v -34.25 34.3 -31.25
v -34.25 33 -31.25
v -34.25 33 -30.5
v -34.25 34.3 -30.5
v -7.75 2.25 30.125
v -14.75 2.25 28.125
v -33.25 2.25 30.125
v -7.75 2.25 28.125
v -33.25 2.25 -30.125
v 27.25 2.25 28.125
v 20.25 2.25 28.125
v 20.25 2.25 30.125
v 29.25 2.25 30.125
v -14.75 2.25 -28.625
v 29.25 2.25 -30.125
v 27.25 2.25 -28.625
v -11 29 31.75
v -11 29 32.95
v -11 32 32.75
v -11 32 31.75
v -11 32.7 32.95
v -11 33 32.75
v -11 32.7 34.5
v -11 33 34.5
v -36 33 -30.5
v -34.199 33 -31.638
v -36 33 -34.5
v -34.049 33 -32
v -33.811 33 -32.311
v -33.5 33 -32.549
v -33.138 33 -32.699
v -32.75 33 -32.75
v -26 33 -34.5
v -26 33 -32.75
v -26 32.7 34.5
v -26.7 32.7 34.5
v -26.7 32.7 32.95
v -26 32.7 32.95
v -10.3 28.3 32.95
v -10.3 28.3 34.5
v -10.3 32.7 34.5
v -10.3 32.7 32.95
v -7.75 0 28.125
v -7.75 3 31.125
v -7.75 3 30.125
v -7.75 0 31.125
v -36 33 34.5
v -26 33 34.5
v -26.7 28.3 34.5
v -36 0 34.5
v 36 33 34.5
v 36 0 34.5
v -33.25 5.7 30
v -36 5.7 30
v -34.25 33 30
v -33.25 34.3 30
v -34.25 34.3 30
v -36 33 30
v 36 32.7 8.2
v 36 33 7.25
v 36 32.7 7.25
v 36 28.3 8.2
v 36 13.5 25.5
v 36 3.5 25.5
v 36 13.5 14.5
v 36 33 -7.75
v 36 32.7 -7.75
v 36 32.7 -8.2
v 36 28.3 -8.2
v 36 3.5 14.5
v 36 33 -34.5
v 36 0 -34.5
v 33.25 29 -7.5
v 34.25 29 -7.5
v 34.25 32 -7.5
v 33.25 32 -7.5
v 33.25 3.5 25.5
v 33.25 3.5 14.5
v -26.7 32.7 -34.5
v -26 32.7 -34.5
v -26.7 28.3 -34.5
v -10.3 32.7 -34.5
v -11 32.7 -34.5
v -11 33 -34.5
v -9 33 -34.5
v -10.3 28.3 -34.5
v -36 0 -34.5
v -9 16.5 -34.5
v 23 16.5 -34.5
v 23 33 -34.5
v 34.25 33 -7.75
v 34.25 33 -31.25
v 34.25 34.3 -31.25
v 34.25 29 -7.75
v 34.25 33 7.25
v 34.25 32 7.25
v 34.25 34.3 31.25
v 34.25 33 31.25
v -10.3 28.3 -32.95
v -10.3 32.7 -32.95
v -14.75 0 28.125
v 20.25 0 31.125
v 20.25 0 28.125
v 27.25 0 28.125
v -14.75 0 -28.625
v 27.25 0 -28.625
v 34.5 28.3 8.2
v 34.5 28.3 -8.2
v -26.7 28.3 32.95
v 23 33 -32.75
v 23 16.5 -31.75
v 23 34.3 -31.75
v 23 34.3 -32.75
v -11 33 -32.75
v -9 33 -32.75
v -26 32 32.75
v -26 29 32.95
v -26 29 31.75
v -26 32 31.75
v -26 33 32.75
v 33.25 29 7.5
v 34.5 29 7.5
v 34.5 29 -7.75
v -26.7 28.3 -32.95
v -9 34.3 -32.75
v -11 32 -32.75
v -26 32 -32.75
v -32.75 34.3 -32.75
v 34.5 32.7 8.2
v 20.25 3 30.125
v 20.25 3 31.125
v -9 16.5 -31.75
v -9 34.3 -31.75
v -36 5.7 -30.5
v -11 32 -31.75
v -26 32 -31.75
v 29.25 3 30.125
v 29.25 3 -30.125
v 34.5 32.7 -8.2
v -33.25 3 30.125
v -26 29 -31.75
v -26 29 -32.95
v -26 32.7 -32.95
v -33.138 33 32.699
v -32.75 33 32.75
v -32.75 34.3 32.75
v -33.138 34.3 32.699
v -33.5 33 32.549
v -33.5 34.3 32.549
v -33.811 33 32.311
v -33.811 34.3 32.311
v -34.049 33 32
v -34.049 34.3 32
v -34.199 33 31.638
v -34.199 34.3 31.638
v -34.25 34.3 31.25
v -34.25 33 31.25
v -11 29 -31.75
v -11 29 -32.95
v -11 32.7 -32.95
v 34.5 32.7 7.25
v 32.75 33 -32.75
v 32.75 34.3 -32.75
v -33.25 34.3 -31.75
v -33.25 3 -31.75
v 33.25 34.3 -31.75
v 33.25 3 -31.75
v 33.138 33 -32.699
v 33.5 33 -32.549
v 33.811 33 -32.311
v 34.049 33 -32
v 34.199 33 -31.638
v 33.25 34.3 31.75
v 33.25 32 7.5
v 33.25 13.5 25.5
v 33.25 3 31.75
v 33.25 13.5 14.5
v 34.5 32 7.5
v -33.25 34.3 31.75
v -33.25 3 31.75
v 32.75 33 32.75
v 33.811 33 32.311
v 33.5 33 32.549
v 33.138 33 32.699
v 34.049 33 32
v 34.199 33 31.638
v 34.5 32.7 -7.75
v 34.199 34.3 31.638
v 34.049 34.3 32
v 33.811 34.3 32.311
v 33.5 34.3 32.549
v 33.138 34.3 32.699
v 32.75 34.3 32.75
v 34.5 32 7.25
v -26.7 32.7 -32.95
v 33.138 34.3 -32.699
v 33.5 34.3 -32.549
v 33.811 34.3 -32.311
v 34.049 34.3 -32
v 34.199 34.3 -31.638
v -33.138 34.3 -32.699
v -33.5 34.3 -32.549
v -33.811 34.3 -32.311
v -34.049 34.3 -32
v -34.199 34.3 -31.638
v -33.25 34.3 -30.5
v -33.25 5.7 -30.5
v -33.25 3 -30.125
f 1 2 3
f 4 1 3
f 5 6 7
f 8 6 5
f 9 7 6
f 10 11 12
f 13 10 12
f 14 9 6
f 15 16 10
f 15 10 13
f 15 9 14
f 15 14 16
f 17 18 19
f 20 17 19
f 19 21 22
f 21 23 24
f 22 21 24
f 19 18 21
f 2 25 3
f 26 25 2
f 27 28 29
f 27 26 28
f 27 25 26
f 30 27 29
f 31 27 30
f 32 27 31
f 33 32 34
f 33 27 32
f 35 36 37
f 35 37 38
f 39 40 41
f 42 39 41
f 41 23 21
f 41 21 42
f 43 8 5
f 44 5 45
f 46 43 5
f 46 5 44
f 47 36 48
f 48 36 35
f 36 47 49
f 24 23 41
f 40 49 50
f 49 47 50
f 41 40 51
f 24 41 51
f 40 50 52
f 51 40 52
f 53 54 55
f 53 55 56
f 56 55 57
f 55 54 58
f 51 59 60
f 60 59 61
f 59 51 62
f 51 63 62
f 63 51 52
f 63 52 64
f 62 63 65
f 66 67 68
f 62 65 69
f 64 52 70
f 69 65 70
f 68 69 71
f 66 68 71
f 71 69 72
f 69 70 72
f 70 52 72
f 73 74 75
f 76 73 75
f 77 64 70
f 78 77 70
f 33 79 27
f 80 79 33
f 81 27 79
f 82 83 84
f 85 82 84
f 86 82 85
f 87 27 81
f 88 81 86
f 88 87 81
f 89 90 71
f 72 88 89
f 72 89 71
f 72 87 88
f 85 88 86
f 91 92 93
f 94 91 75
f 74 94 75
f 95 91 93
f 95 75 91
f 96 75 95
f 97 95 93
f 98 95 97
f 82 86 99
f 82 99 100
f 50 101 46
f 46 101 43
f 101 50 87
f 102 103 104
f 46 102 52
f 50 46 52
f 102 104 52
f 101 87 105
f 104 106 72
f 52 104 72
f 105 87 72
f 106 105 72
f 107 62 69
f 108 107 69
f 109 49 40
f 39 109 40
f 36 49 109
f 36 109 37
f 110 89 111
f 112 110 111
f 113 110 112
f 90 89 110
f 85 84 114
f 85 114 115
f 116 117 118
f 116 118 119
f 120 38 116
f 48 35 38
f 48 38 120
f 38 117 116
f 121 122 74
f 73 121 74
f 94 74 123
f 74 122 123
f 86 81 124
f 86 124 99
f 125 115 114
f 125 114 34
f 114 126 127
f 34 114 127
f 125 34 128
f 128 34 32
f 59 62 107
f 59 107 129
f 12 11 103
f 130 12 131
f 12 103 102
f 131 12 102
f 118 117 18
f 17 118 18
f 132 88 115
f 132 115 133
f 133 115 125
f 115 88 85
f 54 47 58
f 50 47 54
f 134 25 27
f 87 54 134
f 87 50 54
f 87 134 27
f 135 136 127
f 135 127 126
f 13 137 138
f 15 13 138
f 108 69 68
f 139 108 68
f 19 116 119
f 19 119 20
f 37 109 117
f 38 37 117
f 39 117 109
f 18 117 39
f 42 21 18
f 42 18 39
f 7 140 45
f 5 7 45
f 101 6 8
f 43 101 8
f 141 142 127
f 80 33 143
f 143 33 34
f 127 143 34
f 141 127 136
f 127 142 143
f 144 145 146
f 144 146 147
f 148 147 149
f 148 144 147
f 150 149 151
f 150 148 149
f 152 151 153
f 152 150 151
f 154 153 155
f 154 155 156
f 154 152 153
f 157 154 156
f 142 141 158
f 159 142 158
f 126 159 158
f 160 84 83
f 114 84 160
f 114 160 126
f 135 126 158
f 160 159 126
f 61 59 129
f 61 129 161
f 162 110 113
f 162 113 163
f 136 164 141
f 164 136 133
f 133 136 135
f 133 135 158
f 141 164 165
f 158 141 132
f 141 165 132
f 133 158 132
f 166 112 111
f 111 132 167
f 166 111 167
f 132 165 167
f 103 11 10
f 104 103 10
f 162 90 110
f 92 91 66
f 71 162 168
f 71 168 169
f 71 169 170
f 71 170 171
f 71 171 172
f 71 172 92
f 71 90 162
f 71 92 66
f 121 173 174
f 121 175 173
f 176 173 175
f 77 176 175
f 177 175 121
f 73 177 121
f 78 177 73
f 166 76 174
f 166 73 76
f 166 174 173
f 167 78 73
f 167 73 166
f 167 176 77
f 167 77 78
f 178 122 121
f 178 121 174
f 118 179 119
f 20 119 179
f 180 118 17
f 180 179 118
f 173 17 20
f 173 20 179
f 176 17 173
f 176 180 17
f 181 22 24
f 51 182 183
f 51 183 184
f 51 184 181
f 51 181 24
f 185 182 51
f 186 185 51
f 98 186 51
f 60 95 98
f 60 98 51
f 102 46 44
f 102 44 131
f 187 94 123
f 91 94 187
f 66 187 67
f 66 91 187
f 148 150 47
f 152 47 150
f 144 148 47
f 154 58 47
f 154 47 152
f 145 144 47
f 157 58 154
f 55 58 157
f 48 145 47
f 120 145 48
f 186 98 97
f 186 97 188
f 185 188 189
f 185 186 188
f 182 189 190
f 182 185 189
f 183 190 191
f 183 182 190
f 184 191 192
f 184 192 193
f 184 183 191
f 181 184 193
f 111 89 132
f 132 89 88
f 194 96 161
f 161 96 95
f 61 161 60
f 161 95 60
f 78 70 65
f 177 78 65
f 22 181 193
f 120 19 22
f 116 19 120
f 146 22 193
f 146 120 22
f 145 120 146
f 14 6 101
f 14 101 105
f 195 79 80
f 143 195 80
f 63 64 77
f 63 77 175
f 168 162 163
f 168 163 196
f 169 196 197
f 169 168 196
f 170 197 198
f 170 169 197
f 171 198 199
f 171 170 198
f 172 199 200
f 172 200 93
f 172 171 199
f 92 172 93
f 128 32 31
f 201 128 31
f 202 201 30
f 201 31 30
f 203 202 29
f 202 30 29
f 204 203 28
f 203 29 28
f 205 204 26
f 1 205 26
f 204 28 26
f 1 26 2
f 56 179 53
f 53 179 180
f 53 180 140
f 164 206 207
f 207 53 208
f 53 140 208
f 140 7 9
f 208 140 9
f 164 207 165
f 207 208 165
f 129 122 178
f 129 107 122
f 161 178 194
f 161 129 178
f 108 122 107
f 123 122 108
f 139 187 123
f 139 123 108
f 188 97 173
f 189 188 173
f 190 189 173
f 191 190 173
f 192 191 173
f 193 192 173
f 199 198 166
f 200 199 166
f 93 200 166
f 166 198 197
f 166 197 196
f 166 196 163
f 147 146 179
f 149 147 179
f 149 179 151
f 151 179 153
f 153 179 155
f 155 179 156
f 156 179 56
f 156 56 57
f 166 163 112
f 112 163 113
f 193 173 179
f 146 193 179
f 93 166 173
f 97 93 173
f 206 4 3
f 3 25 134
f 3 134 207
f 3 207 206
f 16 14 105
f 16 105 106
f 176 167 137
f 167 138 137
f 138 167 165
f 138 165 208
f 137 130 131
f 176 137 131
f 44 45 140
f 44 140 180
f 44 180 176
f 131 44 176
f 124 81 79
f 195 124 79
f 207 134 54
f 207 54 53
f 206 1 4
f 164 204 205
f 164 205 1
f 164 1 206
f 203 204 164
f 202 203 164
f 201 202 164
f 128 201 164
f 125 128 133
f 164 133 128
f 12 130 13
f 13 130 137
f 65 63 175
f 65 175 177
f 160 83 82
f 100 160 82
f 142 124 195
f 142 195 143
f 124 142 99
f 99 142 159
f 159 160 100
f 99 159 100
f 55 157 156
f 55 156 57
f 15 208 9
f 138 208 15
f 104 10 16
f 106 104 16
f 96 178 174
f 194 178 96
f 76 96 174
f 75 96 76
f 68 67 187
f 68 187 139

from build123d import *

# Parameters (mm, degrees)
SKETCH2_W           = 66.5
SKETCH2_H           = 63.5
BOSS_EXTRUDE1_DEPTH = 3
SKETCH3_W           = 62.5
SKETCH3_H           = 60.25
CUT_EXTRUDE1_DEPTH  = 0.75
SKETCH4_W           = 42
SKETCH4_H           = 56.75
CUT_EXTRUDE2_DEPTH  = 47.029202687
SKETCH6_W           = 72
SKETCH6_H           = 69
SKETCH6_W_2         = 66.5
SKETCH6_H_2         = 63.5
BOSS_EXTRUDE2_DEPTH = 33
SKETCH7_W           = 60.5
SKETCH7_H           = 30
CUT_EXTRUDE3_DEPTH  = 30
SKETCH8_W           = 11
SKETCH8_H           = 10
CUT_EXTRUDE4_DEPTH  = 3
SKETCH10_W          = 32
SKETCH10_H          = 16.5
CUT_EXTRUDE5_DEPTH  = 16.5
BOSS_EXTRUDE3_DEPTH = 1.3
SKETCH12_W          = 15
SKETCH12_H          = 3
CUT_EXTRUDE6_DEPTH  = 86.049926514
SKETCH13_W          = 15
SKETCH13_H          = 3
CUT_EXTRUDE7_DEPTH  = 3
SKETCH14_W          = 16.4
SKETCH14_H          = 4.4
SKETCH14_W_2        = 15
SKETCH14_H_2        = 3
CUT_EXTRUDE9_DEPTH  = 1.55
SKETCH15_W          = 15
SKETCH15_H          = 1.75
CUT_EXTRUDE10_DEPTH = 4
SKETCH17_W          = 16.4
SKETCH17_H          = 4.4
SKETCH17_W_2        = 15
SKETCH17_H_2        = 3
CUT_EXTRUDE12_DEPTH = 1.5
SKETCH16_W          = 1.75
SKETCH16_H          = 15
CUT_EXTRUDE11_DEPTH = 4
SKETCH18_W          = 28
SKETCH18_H          = 3
CUT_EXTRUDE13_DEPTH = 3
SKETCH20_W          = 2.75
SKETCH20_H          = 60.5
BOSS_EXTRUDE4_DEPTH = 2.7


with BuildPart() as part:
    # Sketch2 → Boss-Extrude1 (new body)
    with BuildSketch(Plane(origin=(0, 0, 0), x_dir=(1, 0, 0), z_dir=(0, 1, 0))):
        Rectangle(SKETCH2_W, SKETCH2_H)
    extrude(amount=BOSS_EXTRUDE1_DEPTH)

    # Sketch3 → Cut-Extrude1 (cut)
    with BuildSketch(Plane(origin=(0, 3, 0), x_dir=(1, 0, 0), z_dir=(0, 1, 0))):
        with Locations((-2, 0)):
            Rectangle(SKETCH3_W, SKETCH3_H)
    extrude(amount=-CUT_EXTRUDE1_DEPTH, mode=Mode.SUBTRACT)

    # Sketch4 → Cut-Extrude2 (cut, through all)
    with BuildSketch(Plane(origin=(0, 2.25, 0), x_dir=(1, 0, 0), z_dir=(0, 1, 0))):
        with Locations((6.25, 0.25)):
            Rectangle(SKETCH4_W, SKETCH4_H)
    extrude(amount=-CUT_EXTRUDE2_DEPTH, mode=Mode.SUBTRACT)

    # Sketch6 → Boss-Extrude2 (add)
    with BuildSketch(Plane(origin=(0, 0, 0), x_dir=(1, 0, 0), z_dir=(0, 1, 0))):
        Rectangle(SKETCH6_W, SKETCH6_H)
        Rectangle(SKETCH6_W_2, SKETCH6_H_2, mode=Mode.SUBTRACT)
    extrude(amount=BOSS_EXTRUDE2_DEPTH)

    # Sketch7 → Cut-Extrude3 (cut)
    with BuildSketch(Plane.ZY.offset(36)):
        with Locations((-0.25, 18)):
            Rectangle(SKETCH7_W, SKETCH7_H)
    extrude(amount=-CUT_EXTRUDE3_DEPTH, mode=Mode.SUBTRACT)

    # Sketch8 → Cut-Extrude4 (cut)
    with BuildSketch(Plane(origin=(36, 0, 0), x_dir=(0, 0, -1), z_dir=(1, 0, 0))):
        with Locations((-20, 8.5)):
            Rectangle(SKETCH8_W, SKETCH8_H)
    extrude(amount=-CUT_EXTRUDE4_DEPTH, mode=Mode.SUBTRACT)

    # Sketch10 → Cut-Extrude5 (cut)
    with BuildSketch(Plane(origin=(0, 0, -34.5), x_dir=(-1, 0, 0), z_dir=(0, 0, -1))):
        with Locations((-7, 24.75)):
            Rectangle(SKETCH10_W, SKETCH10_H)
    extrude(amount=-CUT_EXTRUDE5_DEPTH, mode=Mode.SUBTRACT)

    # Sketch11 → Boss-Extrude3 (add)
    with BuildSketch(Plane(origin=(0, 33, 0), x_dir=(1, 0, 0), z_dir=(0, 1, 0))):
        with BuildLine():
            Line((-34.25, 31.25), (-34.25, 30.5))
            Line((-34.25, 30.5), (-33.25, 30.5))
            Line((-33.25, 30.5), (-33.25, 31.75))
            Line((-33.25, 31.75), (-9, 31.75))
            Line((-9, 31.75), (-9, 32.75))
            Line((-9, 32.75), (-32.75, 32.75))
            ThreePointArc((-32.75, 32.75), (-33.810660172, 32.310660172), (-34.25, 31.25))
        make_face()
        with BuildLine():
            Line((-33.25, -31.75), (33.25, -31.75))
            Line((33.25, -31.75), (33.25, 31.75))
            Line((33.25, 31.75), (23, 31.75))
            Line((23, 31.75), (23, 32.75))
            Line((23, 32.75), (32.75, 32.75))
            ThreePointArc((32.75, 32.75), (33.810660172, 32.310660172), (34.25, 31.25))
            Line((34.25, 31.25), (34.25, -31.25))
            ThreePointArc((34.25, -31.25), (33.810660172, -32.310660172), (32.75, -32.75))
            Line((32.75, -32.75), (-32.75, -32.75))
            ThreePointArc((-32.75, -32.75), (-33.810660172, -32.310660172), (-34.25, -31.25))
            Line((-34.25, -31.25), (-34.25, -30))
            Line((-34.25, -30), (-33.25, -30))
            Line((-33.25, -30), (-33.25, -31.75))
        make_face()
    extrude(amount=BOSS_EXTRUDE3_DEPTH)

    # Sketch12 → Cut-Extrude6 (cut, through all)
    with BuildSketch(Plane.XY.offset(34.5)):
        with Locations((-18.5, 30.5)):
            Rectangle(SKETCH12_W, SKETCH12_H)
    extrude(amount=-CUT_EXTRUDE6_DEPTH, mode=Mode.SUBTRACT)

    # Sketch13 → Cut-Extrude7 (cut)
    with BuildSketch(Plane(origin=(36, 0, 0), x_dir=(0, 0, -1), z_dir=(1, 0, 0))):
        with Locations((0, 30.5)):
            Rectangle(SKETCH13_W, SKETCH13_H)
    extrude(amount=-CUT_EXTRUDE7_DEPTH, mode=Mode.SUBTRACT)

    # Sketch14 → Cut-Extrude9 (cut)
    with BuildSketch(Plane.XY.offset(34.5)):
        with Locations((-18.5, 30.5)):
            Rectangle(SKETCH14_W, SKETCH14_H)
        with Locations((-18.5, 30.5)):
            Rectangle(SKETCH14_W_2, SKETCH14_H_2, mode=Mode.SUBTRACT)
    cut_extrude9 = extrude(amount=-CUT_EXTRUDE9_DEPTH, mode=Mode.SUBTRACT)

    # Sketch15 → Cut-Extrude10 (cut)
    with BuildSketch(Plane(origin=(0, 33, 0), x_dir=(1, 0, 0), z_dir=(0, 1, 0))):
        with Locations((-18.5, -33.625)):
            Rectangle(SKETCH15_W, SKETCH15_H)
    cut_extrude10 = extrude(amount=-CUT_EXTRUDE10_DEPTH, mode=Mode.SUBTRACT)

    # Mirror1: Cut-Extrude9, Cut-Extrude10 across plane
    add(cut_extrude9.mirror(Plane.XY), mode=Mode.SUBTRACT)
    add(cut_extrude10.mirror(Plane.XY), mode=Mode.SUBTRACT)

    # Sketch17 → Cut-Extrude12 (cut)
    with BuildSketch(Plane(origin=(36, 0, 0), x_dir=(0, 0, -1), z_dir=(1, 0, 0))):
        with Locations((0, 30.5)):
            Rectangle(SKETCH17_W, SKETCH17_H)
        with Locations((0, 30.5)):
            Rectangle(SKETCH17_W_2, SKETCH17_H_2, mode=Mode.SUBTRACT)
    extrude(amount=-CUT_EXTRUDE12_DEPTH, mode=Mode.SUBTRACT)

    # Sketch16 → Cut-Extrude11 (cut)
    with BuildSketch(Plane(origin=(0, 33, 0), x_dir=(1, 0, 0), z_dir=(0, 1, 0))):
        with Locations((35.125, 0.25)):
            Rectangle(SKETCH16_W, SKETCH16_H)
    extrude(amount=-CUT_EXTRUDE11_DEPTH, mode=Mode.SUBTRACT)

    # Sketch18 → Cut-Extrude13 (cut)
    with BuildSketch(Plane.XZ):
        with Locations((6.25, 29.625)):
            Rectangle(SKETCH18_W, SKETCH18_H)
    extrude(amount=-CUT_EXTRUDE13_DEPTH, mode=Mode.SUBTRACT)

    # Sketch20 → Boss-Extrude4 (add)
    with BuildSketch(Plane(origin=(0, 3, 0), x_dir=(1, 0, 0), z_dir=(0, 1, 0))):
        with Locations((-34.625, 0.25)):
            Rectangle(SKETCH20_W, SKETCH20_H)
    extrude(amount=BOSS_EXTRUDE4_DEPTH)


solid = part.part
